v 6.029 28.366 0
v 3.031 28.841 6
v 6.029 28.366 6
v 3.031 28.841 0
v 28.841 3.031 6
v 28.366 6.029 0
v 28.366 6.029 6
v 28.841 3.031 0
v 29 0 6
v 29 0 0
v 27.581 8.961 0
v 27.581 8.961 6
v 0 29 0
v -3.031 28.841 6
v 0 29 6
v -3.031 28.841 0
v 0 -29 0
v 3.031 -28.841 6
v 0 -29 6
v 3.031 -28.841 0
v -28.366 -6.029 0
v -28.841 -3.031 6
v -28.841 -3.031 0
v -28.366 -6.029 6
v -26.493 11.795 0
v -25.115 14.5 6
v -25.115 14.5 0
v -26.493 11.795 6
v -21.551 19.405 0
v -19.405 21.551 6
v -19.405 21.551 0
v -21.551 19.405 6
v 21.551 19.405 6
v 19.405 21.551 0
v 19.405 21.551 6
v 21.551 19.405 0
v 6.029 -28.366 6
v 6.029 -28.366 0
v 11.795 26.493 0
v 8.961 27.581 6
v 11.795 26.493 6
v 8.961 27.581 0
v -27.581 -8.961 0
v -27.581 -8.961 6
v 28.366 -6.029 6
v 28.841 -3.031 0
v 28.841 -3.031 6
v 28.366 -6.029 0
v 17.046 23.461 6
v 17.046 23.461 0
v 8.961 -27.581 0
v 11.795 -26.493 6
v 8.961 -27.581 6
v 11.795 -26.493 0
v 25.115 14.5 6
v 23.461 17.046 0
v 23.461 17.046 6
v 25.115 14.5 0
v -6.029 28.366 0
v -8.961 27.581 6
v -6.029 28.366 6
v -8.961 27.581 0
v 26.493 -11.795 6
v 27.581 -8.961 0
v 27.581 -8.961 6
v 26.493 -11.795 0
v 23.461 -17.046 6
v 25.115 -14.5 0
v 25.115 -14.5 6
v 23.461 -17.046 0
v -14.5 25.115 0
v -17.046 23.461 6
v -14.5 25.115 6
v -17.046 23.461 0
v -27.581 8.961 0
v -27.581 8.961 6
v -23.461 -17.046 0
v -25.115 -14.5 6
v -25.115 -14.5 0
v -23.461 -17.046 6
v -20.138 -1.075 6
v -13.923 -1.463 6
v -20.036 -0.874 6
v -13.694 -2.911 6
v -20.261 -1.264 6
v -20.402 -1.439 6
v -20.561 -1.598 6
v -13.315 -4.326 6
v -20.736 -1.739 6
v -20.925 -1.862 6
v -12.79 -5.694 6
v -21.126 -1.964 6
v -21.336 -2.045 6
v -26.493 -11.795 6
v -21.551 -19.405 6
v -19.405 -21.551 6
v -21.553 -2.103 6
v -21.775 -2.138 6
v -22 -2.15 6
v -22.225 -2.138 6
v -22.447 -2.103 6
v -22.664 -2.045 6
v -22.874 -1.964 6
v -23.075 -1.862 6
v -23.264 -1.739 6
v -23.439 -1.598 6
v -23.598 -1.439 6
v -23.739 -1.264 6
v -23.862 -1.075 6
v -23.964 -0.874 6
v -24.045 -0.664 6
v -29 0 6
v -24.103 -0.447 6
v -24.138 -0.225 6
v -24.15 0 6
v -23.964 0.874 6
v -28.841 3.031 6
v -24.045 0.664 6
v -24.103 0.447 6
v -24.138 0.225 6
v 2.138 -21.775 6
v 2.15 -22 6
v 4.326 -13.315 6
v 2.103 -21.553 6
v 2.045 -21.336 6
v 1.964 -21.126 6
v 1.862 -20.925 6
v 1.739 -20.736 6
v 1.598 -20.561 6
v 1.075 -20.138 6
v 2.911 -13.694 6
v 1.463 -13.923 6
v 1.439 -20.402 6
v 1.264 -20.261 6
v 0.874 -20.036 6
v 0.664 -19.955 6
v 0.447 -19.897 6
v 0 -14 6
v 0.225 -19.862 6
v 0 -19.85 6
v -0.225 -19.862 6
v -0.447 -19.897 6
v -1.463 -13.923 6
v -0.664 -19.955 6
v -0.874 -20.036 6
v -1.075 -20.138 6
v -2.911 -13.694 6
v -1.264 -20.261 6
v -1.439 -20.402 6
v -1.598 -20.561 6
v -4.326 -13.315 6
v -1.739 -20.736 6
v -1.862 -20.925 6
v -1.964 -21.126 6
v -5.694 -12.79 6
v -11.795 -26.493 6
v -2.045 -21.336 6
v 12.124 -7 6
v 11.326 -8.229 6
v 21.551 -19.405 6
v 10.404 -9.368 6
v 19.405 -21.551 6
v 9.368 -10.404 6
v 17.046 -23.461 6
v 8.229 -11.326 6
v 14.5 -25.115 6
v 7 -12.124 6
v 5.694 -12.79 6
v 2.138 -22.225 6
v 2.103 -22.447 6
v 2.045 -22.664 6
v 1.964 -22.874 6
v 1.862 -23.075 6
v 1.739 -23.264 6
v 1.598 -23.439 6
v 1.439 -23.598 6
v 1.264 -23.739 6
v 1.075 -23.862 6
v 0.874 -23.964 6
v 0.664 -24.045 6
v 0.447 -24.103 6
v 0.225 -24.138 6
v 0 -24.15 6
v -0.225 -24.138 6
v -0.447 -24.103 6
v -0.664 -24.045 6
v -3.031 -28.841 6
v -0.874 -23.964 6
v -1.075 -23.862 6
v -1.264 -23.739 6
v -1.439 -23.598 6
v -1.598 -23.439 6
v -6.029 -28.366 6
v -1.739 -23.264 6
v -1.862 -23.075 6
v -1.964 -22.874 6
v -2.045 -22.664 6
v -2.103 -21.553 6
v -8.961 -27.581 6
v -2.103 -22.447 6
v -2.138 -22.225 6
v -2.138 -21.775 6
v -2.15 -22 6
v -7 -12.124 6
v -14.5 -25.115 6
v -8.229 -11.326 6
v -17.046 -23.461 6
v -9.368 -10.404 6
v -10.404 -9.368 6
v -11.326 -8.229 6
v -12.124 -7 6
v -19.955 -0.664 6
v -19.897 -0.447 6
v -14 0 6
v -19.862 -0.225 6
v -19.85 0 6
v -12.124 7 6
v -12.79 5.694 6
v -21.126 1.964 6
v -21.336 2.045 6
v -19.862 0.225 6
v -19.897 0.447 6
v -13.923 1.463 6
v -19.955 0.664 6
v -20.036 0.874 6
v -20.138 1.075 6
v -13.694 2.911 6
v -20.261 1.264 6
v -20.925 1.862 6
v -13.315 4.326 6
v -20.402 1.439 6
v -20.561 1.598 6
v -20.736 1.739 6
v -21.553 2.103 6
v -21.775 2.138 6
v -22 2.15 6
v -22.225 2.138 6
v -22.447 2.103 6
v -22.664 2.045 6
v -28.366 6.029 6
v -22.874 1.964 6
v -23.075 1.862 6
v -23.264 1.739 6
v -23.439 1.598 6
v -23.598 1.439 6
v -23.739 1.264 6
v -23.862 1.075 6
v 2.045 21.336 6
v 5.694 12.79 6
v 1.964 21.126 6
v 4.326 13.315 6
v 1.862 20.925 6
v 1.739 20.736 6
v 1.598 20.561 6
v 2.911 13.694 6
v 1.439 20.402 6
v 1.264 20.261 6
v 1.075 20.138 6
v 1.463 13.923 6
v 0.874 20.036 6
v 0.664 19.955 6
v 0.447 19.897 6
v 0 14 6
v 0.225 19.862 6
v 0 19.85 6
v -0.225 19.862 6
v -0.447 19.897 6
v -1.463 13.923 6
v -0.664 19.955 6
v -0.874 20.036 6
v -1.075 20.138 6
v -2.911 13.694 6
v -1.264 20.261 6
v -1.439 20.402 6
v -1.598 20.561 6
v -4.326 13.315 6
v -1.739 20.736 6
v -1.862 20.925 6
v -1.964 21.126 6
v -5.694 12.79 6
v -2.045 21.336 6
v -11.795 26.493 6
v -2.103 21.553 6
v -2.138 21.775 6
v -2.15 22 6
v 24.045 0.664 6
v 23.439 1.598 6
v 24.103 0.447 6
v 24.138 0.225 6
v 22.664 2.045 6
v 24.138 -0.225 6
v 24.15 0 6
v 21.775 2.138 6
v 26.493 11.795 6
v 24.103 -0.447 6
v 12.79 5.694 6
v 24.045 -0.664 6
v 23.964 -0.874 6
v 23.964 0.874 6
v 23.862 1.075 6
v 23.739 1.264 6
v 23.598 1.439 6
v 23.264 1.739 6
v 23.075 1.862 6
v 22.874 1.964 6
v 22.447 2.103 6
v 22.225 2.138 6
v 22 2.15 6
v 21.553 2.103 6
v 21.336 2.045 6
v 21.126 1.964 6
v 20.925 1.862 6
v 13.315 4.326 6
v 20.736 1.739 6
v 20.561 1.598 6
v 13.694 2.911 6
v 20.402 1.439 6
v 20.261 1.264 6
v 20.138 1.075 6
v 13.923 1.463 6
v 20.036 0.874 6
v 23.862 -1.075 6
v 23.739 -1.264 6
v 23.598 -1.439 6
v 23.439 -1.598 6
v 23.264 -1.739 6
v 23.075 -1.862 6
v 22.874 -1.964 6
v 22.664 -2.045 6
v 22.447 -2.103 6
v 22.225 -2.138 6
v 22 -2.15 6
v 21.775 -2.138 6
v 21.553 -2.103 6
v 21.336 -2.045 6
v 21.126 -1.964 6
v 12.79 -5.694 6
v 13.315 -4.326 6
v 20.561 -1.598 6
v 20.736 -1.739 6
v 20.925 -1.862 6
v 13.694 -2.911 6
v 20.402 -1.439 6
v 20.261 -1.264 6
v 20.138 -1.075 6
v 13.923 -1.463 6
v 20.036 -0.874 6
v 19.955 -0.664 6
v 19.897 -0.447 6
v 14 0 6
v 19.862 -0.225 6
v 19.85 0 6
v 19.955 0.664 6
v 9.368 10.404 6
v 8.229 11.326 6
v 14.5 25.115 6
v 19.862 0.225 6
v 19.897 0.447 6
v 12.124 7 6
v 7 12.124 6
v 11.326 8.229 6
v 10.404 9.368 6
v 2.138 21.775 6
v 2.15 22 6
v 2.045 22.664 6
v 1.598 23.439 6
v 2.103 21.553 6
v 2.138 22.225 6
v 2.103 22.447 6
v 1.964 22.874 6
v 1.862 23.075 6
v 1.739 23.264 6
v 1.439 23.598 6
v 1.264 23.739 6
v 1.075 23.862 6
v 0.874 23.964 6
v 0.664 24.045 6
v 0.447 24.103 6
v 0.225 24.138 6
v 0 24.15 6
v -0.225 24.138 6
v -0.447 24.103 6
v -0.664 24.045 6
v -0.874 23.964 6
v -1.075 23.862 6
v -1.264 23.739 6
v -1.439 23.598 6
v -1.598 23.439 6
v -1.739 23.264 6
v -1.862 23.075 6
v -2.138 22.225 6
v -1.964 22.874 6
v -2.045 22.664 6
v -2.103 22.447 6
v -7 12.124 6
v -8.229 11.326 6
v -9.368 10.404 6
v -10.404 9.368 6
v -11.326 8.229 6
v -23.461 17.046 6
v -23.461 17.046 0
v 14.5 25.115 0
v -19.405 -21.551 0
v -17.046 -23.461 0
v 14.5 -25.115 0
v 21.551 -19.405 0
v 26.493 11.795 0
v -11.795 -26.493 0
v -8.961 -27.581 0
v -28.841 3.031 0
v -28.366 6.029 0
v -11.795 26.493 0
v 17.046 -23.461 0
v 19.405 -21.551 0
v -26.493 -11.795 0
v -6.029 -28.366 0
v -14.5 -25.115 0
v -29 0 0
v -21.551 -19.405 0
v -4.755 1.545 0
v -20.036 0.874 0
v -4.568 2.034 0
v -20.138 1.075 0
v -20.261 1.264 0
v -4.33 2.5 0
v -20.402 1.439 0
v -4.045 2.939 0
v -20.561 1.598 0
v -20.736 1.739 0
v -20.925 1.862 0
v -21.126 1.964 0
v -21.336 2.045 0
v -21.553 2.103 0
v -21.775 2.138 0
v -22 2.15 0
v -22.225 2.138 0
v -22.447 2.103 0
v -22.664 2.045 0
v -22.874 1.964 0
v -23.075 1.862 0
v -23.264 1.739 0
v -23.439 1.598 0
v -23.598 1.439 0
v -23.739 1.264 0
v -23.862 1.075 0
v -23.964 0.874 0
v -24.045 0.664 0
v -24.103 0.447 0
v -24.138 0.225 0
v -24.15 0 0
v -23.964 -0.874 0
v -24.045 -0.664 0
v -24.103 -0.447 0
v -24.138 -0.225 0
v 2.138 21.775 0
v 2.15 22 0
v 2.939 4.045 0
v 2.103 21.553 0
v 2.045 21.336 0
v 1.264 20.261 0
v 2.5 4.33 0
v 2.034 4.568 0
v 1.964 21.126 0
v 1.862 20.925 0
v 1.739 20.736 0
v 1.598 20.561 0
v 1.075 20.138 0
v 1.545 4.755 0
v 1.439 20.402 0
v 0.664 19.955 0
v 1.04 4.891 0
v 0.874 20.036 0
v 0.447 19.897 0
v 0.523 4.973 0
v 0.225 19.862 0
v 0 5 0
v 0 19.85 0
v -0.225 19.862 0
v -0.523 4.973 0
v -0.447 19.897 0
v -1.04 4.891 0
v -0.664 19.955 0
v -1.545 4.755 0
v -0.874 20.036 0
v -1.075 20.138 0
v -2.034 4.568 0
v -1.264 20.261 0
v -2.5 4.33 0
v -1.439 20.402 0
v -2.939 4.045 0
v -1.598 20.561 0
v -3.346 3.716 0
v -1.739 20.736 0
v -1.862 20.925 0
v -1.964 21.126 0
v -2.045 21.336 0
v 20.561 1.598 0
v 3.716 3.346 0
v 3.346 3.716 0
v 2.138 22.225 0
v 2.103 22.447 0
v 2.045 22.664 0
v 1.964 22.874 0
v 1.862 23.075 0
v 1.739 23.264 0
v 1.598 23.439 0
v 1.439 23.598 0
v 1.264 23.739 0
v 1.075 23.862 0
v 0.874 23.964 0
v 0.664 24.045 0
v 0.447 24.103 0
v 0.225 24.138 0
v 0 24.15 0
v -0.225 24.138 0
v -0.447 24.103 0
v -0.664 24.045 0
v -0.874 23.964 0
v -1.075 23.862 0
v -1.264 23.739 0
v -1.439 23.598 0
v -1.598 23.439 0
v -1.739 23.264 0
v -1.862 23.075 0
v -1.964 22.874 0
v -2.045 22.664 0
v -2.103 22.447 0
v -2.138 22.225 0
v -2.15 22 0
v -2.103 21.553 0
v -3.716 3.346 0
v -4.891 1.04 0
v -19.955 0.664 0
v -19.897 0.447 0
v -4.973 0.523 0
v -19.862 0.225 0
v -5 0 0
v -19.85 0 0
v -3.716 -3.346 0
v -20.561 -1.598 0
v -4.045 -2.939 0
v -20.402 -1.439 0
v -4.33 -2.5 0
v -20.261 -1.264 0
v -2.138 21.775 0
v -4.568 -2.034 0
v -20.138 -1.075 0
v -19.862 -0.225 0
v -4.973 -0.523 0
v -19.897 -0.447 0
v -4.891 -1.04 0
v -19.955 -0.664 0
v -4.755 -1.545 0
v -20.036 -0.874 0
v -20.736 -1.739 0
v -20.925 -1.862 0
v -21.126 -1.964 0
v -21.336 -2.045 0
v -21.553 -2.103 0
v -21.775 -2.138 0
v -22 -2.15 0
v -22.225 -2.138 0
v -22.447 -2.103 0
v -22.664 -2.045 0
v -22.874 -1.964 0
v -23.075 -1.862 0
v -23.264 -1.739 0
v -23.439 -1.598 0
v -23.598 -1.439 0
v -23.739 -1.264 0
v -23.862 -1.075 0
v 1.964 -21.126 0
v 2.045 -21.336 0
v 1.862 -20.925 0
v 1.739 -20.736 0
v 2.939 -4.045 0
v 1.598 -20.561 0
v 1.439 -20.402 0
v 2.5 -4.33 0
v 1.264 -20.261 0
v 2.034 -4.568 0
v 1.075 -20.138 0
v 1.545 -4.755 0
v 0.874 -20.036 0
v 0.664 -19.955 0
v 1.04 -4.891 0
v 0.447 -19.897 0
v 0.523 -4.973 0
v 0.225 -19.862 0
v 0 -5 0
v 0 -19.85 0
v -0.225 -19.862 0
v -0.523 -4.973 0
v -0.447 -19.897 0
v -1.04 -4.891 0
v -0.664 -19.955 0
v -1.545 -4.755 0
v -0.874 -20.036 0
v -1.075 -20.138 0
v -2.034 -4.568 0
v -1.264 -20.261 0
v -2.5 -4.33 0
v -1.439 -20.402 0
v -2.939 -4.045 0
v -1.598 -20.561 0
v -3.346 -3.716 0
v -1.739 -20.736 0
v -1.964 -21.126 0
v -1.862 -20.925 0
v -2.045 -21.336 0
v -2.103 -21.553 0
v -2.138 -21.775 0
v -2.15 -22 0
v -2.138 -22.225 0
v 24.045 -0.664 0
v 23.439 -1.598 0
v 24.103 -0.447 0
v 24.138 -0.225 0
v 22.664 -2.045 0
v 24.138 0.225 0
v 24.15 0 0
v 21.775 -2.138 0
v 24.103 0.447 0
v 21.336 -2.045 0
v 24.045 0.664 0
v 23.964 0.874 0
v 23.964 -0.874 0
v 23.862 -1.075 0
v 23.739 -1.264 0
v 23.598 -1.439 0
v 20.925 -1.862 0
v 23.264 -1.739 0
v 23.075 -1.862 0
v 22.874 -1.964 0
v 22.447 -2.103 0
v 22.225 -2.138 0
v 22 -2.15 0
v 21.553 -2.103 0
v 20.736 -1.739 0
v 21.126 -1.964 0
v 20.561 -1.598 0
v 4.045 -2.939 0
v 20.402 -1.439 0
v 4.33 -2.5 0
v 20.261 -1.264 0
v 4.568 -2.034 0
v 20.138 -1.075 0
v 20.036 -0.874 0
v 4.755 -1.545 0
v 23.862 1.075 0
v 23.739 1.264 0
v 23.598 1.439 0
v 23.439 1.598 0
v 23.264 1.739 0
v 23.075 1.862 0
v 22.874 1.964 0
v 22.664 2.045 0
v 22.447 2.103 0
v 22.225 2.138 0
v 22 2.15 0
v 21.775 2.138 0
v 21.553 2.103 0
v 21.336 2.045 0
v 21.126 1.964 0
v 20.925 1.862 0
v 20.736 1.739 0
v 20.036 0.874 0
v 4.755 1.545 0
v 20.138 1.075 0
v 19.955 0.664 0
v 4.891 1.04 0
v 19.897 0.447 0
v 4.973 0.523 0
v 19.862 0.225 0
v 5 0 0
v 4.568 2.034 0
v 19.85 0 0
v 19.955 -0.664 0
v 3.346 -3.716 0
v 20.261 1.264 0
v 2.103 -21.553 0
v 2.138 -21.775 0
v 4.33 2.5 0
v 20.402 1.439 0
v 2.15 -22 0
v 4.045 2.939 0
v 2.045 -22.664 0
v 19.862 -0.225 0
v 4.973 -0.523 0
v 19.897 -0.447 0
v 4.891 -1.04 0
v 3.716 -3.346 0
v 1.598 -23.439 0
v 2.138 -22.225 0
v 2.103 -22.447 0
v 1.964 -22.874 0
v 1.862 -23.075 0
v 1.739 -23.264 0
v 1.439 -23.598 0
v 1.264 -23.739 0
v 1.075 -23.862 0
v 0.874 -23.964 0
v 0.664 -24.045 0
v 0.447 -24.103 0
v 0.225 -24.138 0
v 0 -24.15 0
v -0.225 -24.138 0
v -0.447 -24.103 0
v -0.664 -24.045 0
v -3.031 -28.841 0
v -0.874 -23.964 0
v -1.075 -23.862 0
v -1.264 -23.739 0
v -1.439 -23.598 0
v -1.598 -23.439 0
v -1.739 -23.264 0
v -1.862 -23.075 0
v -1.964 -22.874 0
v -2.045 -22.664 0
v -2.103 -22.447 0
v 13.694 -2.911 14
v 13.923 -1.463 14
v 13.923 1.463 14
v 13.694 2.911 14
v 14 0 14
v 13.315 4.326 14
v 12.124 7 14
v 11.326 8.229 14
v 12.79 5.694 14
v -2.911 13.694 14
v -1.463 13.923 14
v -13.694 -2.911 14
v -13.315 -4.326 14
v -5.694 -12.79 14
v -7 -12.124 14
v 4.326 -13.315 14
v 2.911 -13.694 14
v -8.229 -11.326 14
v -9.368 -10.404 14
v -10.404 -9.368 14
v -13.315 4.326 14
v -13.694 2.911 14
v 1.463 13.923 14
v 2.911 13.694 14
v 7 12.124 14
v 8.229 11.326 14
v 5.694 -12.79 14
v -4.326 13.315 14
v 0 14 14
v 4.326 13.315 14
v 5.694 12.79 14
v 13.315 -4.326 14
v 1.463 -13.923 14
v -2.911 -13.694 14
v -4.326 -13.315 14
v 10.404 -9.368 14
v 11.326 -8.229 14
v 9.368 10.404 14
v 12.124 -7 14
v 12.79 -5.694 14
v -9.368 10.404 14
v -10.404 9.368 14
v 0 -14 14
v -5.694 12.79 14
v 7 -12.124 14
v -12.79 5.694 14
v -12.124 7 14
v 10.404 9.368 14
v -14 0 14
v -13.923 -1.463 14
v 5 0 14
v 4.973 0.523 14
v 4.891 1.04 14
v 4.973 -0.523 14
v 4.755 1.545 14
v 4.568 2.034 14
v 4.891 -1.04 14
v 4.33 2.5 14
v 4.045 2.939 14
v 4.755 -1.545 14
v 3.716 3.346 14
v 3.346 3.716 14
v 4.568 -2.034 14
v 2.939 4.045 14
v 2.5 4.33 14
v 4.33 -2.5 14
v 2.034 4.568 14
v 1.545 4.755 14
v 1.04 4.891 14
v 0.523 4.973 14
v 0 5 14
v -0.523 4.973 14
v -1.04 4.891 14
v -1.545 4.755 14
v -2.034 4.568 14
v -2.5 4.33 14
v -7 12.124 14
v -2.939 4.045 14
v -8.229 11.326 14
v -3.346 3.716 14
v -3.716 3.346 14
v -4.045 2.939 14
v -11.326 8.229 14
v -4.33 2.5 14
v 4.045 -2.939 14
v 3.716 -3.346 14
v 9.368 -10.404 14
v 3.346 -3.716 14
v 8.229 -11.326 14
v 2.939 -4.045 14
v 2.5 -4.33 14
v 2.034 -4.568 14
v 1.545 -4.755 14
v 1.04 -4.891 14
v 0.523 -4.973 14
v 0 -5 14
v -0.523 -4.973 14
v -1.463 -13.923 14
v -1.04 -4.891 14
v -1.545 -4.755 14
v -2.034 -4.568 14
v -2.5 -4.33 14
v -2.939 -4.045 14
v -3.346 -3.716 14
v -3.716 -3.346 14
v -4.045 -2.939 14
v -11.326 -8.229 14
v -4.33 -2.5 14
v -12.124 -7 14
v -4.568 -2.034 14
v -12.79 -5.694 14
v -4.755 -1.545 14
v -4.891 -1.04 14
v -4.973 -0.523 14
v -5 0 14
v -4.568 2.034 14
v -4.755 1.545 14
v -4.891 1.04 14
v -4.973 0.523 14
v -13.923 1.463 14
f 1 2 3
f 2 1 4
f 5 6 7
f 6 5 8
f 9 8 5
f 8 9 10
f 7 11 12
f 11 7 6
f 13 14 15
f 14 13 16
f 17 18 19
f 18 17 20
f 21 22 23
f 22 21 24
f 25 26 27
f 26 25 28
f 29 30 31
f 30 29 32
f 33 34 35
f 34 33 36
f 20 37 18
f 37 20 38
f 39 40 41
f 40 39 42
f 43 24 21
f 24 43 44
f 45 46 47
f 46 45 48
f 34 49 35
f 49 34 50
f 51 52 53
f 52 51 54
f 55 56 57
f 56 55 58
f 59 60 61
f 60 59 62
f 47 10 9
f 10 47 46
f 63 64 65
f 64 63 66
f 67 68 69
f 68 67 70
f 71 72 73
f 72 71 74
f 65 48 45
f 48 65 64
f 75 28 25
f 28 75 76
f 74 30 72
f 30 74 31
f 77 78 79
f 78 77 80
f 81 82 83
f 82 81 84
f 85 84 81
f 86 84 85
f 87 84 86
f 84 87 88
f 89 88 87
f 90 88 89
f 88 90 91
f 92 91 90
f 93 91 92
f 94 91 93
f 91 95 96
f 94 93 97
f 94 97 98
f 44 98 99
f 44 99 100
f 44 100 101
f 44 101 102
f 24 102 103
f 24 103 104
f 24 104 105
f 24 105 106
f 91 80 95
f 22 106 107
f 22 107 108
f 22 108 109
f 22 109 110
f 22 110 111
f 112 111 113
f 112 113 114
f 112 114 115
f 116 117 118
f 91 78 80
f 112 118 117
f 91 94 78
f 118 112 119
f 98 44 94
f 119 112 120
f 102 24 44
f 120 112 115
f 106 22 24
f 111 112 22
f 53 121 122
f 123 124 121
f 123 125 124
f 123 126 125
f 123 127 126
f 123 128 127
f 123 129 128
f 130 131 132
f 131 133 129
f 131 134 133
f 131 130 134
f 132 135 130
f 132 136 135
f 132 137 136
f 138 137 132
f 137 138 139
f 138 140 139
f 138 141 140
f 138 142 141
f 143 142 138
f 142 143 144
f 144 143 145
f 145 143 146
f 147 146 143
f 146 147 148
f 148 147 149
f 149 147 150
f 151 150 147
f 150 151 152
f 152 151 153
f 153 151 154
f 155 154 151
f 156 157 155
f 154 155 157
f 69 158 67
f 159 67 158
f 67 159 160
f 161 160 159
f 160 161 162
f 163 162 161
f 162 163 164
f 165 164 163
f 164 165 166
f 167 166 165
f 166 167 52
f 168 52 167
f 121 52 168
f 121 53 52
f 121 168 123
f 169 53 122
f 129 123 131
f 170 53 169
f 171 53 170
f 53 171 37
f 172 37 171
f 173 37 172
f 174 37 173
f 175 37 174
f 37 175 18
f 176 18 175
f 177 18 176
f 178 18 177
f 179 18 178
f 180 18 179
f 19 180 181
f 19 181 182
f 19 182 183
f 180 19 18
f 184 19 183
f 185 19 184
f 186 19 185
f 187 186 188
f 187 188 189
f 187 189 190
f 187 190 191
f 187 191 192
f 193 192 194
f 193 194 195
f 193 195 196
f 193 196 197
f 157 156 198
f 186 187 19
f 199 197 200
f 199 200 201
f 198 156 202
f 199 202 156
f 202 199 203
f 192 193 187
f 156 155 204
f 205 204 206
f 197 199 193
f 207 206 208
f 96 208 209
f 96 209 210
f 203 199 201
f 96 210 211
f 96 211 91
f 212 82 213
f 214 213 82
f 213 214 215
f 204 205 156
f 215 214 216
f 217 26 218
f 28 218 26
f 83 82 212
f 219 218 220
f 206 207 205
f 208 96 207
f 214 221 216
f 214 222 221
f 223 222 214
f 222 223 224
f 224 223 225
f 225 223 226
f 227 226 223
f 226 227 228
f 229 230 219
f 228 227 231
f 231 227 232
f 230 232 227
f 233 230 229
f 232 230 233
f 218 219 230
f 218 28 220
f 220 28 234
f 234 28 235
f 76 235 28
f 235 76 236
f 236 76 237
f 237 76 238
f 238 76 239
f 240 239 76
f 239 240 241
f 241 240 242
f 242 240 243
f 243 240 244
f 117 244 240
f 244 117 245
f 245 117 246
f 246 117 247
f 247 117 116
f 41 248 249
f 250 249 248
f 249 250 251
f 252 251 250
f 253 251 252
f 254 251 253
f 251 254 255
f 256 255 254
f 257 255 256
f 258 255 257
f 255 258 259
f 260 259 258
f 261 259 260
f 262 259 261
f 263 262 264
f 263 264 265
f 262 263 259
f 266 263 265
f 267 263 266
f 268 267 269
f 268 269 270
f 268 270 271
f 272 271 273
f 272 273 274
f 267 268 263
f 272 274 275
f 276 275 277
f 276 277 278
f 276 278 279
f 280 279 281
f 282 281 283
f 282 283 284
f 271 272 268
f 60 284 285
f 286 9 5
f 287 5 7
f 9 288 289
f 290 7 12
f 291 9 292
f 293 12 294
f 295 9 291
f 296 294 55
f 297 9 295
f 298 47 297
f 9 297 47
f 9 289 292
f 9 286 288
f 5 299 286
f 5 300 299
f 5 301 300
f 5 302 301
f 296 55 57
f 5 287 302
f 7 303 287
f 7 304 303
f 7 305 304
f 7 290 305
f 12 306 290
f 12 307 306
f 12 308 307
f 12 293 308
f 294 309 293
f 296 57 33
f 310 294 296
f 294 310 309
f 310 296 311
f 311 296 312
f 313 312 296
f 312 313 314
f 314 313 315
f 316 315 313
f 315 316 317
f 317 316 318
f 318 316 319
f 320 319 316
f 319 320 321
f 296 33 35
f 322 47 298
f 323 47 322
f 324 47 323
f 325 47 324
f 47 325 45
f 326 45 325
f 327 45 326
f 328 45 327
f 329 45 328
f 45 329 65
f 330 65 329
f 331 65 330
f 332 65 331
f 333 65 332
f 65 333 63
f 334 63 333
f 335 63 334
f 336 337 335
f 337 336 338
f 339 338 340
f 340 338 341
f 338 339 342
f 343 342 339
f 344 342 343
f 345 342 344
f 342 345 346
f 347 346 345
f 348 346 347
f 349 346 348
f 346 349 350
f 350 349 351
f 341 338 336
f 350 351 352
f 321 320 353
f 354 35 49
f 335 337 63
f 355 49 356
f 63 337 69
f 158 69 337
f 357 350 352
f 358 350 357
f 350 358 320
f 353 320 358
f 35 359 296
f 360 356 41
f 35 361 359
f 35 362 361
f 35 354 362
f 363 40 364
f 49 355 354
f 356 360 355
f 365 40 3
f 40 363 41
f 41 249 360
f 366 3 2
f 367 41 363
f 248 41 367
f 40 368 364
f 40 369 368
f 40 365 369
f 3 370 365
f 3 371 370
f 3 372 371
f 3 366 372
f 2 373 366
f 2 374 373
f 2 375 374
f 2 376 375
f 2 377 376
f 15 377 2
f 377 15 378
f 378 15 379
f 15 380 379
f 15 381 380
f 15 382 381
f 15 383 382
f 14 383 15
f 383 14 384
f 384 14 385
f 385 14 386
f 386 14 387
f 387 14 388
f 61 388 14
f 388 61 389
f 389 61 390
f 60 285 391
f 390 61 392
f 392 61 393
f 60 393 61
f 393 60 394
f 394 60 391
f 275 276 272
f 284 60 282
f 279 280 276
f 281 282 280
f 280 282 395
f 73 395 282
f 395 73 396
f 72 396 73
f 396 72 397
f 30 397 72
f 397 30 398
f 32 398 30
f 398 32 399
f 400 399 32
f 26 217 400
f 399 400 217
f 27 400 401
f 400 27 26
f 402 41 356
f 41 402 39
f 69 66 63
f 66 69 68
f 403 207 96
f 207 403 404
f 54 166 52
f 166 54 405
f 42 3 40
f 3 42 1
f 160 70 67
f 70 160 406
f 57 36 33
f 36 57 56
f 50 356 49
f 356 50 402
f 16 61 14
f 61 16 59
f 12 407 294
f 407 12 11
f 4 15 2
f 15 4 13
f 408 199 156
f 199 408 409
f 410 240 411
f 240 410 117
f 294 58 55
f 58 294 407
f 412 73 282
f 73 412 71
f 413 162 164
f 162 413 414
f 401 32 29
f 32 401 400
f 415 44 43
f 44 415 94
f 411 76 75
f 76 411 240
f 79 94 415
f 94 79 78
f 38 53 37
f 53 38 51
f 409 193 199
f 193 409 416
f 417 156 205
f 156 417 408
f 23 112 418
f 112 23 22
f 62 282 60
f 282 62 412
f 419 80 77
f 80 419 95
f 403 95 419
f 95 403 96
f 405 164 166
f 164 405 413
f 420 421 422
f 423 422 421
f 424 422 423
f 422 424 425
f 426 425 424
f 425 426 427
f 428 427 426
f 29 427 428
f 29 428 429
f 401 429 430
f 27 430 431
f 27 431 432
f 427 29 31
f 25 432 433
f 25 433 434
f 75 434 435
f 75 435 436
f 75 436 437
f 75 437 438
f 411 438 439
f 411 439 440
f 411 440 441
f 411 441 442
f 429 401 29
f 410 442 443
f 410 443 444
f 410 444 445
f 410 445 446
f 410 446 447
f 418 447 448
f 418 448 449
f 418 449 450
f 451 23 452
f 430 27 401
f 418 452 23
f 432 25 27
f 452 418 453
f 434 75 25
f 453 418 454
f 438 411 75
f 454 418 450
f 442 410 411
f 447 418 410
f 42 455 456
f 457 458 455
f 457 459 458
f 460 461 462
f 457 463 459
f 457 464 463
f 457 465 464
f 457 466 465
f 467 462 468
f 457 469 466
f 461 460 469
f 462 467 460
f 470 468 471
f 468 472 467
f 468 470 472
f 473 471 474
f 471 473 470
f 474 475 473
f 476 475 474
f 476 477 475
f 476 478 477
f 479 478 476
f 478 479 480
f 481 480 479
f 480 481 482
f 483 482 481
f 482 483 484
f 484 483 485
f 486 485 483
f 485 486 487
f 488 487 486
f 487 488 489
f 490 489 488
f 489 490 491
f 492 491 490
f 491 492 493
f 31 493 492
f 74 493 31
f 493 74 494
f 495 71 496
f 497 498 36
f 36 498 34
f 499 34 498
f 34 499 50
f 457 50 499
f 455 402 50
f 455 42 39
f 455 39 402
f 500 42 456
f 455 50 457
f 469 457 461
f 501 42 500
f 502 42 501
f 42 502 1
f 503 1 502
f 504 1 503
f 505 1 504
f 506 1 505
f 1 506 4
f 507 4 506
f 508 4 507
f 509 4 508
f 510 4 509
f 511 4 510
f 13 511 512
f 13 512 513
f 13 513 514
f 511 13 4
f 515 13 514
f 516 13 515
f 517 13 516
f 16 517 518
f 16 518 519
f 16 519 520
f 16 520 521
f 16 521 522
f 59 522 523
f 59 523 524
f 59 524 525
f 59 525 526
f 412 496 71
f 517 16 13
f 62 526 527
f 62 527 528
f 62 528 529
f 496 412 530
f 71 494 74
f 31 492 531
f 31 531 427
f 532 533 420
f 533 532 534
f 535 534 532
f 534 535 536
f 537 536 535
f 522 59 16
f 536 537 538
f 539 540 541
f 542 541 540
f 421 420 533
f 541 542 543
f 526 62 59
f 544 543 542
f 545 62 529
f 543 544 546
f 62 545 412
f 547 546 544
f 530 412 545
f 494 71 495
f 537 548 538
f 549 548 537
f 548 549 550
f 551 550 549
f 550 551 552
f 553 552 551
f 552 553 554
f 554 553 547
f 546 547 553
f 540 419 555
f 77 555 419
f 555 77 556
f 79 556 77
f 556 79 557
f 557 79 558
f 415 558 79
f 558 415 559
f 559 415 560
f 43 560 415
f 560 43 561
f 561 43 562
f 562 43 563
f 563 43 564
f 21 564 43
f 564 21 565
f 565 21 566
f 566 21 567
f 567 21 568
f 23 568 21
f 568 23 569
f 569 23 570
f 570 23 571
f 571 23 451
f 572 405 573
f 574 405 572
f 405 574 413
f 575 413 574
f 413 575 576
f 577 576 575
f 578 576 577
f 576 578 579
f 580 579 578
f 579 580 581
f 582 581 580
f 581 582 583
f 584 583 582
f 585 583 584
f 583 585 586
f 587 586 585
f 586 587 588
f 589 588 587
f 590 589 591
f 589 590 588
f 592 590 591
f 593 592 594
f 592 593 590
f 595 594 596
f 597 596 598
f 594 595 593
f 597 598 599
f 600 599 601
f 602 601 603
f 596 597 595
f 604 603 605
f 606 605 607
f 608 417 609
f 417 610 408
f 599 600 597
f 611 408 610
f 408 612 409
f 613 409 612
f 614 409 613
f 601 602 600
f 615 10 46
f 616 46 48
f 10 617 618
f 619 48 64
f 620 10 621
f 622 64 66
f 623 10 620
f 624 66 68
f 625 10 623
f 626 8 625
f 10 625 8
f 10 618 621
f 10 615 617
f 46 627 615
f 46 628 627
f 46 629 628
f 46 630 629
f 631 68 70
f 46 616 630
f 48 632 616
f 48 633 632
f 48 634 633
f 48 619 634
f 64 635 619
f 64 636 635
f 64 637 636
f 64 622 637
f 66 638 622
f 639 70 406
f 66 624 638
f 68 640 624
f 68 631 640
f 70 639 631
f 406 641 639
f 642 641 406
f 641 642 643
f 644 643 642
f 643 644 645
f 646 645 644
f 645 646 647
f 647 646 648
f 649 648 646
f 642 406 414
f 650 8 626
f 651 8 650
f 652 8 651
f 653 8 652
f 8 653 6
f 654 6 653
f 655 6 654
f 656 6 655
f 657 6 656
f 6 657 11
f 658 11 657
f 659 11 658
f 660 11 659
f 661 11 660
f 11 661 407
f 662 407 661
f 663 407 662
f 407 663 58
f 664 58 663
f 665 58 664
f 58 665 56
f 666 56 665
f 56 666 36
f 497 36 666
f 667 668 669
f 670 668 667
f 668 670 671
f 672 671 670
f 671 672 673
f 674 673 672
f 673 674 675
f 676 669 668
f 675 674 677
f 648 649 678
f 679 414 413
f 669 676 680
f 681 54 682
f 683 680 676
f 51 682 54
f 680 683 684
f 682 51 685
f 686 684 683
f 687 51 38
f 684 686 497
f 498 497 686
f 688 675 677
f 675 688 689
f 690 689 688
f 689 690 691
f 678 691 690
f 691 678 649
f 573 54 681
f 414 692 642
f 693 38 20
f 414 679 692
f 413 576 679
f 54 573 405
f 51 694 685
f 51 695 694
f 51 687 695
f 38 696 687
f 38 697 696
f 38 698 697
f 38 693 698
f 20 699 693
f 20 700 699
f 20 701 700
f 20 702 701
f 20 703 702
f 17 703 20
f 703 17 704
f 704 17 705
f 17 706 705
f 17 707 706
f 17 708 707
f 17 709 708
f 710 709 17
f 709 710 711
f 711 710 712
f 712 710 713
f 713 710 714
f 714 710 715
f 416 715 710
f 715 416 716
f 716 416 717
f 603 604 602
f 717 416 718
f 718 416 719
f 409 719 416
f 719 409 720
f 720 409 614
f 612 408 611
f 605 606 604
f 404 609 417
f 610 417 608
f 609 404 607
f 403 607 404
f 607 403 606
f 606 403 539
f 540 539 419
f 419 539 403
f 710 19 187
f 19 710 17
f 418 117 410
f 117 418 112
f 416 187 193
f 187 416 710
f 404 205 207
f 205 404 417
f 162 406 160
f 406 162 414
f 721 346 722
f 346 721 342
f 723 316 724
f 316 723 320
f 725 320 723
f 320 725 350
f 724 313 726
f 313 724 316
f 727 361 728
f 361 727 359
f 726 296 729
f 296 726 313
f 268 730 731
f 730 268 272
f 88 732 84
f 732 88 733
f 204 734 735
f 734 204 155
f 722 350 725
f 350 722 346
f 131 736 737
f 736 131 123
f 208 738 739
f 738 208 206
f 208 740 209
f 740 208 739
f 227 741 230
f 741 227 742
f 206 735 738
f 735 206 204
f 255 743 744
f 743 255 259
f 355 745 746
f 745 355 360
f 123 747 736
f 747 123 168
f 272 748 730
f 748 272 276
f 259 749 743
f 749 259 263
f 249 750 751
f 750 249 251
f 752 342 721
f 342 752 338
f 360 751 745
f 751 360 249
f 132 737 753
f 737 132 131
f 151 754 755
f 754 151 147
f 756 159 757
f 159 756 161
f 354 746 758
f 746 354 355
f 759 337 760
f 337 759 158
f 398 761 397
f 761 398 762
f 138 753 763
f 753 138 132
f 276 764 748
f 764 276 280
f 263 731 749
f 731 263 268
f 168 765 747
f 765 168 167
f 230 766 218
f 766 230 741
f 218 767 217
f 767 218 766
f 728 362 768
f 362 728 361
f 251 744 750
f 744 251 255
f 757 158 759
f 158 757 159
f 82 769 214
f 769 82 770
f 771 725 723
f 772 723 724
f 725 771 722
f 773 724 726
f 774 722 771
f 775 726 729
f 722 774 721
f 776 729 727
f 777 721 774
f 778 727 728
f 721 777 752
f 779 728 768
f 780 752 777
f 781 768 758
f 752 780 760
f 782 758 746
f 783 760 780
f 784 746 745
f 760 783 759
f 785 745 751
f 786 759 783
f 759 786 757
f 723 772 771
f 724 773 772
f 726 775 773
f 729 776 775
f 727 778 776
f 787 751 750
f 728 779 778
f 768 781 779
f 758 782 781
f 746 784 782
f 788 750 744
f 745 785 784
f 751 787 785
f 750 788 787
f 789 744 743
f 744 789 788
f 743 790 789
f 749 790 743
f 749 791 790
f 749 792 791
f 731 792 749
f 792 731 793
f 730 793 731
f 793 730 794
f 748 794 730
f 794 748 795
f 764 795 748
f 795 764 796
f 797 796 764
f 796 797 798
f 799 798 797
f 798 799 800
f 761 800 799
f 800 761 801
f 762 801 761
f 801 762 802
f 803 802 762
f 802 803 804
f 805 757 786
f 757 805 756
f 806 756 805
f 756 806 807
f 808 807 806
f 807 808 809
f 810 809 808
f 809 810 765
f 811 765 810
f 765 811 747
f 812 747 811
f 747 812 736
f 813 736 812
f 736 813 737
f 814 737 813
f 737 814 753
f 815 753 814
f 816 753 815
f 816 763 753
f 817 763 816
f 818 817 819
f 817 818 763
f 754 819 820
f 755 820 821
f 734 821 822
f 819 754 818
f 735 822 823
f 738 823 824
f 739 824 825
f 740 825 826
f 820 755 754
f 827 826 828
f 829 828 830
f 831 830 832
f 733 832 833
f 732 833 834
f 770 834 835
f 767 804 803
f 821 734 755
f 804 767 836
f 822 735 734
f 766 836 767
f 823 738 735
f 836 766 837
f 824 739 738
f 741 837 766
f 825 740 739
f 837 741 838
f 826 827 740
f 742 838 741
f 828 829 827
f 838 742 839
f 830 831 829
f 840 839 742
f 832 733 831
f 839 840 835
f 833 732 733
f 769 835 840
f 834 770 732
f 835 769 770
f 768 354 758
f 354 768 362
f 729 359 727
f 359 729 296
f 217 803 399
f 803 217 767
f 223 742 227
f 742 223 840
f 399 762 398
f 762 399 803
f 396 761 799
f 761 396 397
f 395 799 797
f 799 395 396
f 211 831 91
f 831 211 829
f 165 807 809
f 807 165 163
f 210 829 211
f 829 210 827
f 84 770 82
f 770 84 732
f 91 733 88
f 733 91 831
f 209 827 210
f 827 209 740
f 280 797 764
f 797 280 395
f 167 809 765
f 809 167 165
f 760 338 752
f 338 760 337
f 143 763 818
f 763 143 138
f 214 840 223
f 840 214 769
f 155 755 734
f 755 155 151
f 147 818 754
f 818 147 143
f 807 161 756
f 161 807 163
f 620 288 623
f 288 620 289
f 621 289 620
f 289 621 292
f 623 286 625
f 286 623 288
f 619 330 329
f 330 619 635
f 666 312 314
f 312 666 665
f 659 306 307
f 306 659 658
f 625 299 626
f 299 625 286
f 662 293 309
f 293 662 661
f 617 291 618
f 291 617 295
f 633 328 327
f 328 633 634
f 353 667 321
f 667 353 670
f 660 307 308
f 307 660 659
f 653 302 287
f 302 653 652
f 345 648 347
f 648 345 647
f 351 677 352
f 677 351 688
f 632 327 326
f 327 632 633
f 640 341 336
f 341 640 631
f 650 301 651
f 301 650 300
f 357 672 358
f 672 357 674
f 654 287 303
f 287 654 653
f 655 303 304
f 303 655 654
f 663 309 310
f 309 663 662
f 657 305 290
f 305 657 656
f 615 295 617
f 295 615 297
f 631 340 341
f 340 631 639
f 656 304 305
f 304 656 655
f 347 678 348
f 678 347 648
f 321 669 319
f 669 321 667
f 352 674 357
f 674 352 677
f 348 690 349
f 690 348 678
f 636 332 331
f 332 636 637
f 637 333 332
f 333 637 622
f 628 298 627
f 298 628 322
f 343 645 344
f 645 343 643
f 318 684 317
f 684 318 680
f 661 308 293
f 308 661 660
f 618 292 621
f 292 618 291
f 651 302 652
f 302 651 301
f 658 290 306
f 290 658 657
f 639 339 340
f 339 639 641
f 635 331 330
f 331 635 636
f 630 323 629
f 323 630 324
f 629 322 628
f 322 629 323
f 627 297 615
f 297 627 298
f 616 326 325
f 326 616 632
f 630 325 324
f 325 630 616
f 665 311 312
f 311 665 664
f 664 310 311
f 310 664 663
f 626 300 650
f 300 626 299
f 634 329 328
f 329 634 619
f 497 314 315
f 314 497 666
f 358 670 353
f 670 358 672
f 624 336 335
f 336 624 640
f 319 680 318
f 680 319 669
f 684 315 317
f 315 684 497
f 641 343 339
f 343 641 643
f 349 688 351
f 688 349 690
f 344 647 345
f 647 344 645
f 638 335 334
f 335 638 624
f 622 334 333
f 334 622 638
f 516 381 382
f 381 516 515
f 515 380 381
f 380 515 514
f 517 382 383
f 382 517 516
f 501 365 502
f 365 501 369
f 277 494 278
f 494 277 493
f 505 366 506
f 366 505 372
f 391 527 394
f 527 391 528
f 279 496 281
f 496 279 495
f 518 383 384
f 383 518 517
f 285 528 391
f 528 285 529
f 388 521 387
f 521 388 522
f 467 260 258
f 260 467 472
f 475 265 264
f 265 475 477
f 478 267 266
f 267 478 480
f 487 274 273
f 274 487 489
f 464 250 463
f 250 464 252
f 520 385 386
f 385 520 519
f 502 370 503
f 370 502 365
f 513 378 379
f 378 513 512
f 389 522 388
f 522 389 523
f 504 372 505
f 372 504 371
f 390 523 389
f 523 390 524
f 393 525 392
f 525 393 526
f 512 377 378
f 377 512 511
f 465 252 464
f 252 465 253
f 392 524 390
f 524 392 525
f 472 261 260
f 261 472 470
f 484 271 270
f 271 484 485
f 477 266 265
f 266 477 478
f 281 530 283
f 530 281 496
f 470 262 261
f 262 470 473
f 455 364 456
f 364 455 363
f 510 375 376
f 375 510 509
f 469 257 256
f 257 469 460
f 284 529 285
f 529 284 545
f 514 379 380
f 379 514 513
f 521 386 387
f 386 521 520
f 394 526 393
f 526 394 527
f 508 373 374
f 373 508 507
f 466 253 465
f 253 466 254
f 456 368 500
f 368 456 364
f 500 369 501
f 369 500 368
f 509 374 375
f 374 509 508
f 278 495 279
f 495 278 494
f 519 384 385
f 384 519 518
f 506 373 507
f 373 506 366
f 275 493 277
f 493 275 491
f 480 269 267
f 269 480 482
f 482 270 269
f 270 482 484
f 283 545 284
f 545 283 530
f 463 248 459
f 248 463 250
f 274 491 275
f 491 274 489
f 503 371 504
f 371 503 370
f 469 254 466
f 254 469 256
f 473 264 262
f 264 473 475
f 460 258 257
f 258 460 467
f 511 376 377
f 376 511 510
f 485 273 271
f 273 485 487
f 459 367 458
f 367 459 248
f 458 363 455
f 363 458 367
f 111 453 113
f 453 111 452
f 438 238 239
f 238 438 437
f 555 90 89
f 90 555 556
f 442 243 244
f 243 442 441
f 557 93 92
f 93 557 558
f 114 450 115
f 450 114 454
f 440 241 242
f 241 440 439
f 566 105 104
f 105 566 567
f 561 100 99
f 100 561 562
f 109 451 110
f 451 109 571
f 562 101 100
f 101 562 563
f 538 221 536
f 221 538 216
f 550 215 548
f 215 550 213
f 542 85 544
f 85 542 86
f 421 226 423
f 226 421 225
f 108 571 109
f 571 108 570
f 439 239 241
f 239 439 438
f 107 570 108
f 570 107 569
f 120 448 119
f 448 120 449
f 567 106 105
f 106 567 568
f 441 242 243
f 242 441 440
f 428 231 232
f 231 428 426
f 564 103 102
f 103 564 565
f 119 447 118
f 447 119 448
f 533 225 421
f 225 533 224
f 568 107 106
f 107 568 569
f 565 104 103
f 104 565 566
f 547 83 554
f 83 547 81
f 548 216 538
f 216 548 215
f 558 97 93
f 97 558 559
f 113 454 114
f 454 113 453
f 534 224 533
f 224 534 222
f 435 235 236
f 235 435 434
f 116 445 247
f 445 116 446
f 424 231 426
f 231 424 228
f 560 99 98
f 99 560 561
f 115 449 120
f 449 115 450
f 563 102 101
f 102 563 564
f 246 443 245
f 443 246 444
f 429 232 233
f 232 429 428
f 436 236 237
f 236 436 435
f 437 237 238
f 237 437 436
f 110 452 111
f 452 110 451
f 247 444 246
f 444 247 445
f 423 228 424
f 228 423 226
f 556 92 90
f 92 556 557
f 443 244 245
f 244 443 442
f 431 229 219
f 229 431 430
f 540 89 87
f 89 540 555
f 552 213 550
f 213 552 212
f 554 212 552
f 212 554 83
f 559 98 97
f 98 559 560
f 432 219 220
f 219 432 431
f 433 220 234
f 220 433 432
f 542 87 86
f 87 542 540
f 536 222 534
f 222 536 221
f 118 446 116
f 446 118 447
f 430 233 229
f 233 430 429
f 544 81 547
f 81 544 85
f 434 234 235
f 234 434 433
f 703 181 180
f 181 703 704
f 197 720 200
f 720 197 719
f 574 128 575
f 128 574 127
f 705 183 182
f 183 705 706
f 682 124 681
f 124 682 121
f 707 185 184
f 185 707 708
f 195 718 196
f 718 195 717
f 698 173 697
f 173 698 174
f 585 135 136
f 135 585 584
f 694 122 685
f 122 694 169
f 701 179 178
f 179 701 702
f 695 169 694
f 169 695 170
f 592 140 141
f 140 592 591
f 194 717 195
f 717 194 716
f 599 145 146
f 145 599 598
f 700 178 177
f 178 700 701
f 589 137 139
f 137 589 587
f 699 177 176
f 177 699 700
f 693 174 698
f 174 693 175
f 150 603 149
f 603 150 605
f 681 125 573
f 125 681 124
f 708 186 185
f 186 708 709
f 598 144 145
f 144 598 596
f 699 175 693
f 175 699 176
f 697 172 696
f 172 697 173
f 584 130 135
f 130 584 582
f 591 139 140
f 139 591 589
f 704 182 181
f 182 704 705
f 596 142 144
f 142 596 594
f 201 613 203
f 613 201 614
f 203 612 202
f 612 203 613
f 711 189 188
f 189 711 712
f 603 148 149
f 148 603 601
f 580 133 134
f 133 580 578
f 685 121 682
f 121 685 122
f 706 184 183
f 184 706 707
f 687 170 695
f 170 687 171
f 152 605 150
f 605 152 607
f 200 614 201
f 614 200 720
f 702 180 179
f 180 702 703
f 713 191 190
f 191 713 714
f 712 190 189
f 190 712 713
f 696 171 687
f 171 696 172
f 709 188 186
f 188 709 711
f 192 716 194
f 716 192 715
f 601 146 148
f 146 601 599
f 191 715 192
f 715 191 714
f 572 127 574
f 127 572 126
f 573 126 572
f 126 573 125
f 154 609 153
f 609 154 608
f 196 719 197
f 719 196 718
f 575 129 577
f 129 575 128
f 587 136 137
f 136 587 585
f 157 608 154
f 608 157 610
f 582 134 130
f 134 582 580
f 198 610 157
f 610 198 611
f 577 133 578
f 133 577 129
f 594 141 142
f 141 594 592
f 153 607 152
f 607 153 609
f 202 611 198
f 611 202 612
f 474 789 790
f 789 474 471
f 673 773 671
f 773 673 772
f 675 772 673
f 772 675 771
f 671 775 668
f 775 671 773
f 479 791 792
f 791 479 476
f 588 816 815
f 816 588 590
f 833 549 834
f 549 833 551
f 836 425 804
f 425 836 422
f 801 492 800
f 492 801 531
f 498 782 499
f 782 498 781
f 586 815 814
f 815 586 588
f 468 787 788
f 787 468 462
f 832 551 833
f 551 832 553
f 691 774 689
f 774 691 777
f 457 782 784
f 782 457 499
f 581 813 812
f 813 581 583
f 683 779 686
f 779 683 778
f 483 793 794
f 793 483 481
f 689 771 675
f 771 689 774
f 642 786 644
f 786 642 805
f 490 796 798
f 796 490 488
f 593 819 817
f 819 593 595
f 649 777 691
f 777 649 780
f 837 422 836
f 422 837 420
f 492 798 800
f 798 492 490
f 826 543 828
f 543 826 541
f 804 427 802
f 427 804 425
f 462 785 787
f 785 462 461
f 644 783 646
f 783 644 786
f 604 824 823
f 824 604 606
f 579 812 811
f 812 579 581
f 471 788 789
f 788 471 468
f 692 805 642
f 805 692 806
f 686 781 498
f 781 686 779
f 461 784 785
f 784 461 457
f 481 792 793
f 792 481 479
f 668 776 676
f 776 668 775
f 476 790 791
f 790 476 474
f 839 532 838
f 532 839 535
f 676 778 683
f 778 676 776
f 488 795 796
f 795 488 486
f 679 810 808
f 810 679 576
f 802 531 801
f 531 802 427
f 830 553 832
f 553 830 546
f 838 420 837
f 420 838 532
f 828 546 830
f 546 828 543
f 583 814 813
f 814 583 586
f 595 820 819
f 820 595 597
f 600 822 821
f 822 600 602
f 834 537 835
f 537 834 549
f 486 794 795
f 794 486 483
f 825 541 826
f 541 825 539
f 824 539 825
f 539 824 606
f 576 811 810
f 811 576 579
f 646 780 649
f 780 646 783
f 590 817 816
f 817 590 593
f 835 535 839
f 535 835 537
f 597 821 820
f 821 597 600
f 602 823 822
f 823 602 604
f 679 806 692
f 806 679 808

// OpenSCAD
// Four-bolt mounting flange: four-bolt mechanical mounting flange with a reinforced hub.
$fn = 60;
eps = 0.02;
flange_d = 58;
flange_t = 6;
hub_d = 28;
hub_h = 14;
center_d = 10;
bolt_circle_d = 44;
bolt_d = 4.3;

difference() {
    union() {
        cylinder(d = flange_d, h = flange_t);
        cylinder(d = hub_d, h = hub_h);
    }
    translate([0, 0, -eps]) cylinder(d = center_d, h = hub_h + 2 * eps);
    for (i = [0 : 3]) rotate([0, 0, i * 90])
        translate([bolt_circle_d / 2, 0, -eps]) cylinder(d = bolt_d, h = flange_t + 2 * eps);
}
